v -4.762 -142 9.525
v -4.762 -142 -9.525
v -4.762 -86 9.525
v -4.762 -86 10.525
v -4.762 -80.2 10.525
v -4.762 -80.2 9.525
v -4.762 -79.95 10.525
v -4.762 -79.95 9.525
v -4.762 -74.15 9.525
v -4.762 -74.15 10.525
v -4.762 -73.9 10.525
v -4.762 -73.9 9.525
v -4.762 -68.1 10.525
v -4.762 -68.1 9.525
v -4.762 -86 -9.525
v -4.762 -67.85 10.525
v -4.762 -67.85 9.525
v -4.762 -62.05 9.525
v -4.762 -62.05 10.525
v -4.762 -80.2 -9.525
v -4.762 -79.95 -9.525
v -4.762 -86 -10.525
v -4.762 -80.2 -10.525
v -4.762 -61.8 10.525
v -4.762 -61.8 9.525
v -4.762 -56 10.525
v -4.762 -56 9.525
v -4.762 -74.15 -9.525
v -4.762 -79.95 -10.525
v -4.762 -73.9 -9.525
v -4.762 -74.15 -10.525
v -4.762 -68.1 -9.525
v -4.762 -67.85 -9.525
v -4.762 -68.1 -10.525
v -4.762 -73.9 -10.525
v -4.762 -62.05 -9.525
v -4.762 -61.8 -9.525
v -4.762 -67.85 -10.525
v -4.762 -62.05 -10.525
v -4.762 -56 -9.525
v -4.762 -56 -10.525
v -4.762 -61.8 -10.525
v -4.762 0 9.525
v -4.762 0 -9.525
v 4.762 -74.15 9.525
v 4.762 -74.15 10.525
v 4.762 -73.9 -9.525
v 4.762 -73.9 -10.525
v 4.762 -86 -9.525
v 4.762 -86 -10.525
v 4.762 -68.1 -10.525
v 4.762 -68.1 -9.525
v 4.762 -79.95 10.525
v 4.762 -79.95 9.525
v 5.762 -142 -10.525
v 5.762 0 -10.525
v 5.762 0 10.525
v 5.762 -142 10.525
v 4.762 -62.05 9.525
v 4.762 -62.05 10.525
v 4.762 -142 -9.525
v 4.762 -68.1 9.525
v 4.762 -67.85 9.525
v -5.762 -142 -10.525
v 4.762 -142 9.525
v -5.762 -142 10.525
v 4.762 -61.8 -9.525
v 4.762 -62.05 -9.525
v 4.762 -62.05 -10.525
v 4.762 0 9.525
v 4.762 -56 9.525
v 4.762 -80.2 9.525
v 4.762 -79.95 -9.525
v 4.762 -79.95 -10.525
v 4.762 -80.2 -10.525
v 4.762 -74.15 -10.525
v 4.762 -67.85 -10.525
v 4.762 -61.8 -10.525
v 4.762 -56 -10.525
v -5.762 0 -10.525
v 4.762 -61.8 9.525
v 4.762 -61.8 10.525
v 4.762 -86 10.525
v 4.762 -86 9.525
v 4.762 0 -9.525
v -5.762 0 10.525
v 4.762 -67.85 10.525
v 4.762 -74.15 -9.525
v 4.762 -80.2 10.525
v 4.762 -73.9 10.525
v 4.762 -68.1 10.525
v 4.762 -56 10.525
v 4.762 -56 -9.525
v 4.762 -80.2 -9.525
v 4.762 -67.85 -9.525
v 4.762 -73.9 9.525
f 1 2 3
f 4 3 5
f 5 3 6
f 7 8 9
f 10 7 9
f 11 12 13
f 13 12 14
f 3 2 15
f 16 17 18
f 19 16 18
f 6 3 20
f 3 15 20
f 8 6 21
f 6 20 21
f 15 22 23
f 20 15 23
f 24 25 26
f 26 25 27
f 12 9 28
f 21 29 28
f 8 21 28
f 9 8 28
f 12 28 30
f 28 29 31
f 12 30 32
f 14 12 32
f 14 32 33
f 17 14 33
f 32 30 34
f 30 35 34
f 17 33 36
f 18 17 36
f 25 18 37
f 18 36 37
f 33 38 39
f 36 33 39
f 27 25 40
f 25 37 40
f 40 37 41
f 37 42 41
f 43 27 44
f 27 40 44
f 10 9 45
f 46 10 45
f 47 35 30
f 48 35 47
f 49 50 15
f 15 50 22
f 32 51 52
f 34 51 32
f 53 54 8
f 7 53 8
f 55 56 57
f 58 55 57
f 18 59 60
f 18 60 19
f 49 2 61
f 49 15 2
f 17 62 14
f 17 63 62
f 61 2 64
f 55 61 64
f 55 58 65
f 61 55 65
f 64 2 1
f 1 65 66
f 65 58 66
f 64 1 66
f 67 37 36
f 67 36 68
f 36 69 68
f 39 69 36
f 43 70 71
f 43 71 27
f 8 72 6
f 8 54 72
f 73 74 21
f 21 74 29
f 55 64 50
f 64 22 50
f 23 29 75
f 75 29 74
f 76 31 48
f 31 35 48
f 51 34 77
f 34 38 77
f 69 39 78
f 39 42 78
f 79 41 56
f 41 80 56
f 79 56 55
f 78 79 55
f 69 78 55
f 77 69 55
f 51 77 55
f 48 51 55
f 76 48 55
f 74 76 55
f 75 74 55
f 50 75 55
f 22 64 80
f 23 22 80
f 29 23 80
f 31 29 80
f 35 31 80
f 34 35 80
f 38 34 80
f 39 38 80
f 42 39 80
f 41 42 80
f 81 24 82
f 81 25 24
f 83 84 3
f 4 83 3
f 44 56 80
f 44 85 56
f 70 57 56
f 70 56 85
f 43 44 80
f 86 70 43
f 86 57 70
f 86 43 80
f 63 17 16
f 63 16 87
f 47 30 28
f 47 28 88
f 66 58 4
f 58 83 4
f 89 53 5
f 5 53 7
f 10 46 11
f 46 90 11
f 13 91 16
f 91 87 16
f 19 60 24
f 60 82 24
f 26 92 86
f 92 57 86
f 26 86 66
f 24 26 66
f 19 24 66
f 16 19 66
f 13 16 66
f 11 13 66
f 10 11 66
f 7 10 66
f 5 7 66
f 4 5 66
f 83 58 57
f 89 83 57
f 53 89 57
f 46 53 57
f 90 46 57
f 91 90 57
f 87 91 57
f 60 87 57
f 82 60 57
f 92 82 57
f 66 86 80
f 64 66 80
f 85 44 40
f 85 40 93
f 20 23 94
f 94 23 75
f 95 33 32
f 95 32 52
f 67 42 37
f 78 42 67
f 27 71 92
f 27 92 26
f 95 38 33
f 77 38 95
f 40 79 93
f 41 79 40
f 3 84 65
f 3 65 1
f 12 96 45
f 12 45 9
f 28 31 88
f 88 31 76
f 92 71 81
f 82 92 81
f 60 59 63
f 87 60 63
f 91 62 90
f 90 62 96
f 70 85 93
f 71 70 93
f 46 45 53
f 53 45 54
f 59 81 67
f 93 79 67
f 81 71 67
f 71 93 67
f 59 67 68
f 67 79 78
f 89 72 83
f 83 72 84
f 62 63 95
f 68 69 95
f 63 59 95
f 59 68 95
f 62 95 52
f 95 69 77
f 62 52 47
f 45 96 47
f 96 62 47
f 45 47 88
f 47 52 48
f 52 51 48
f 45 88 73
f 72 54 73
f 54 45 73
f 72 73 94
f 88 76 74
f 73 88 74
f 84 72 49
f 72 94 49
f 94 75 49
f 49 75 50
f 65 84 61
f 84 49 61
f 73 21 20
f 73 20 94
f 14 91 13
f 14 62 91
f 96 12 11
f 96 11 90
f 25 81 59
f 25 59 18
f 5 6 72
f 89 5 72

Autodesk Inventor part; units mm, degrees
ref_plane "YZ Plane" through (0, 0, 0) normal (1, 0, 0) x (0, 1, 0)
ref_plane "XZ Plane" through (0, 0, 0) normal (0, 1, 0) x (-1, 0, 0)
ref_plane "XY Plane" through (0, 0, 0) normal (0, 0, 1) x (1, 0, 0)
sketch "Sketch1" plane through (0, 0, 0) normal (0, 1, 0) x (-1, 0, 0)
  line L0 (4.7625, -9.525) -> (-4.7625, -9.525)
  line L1 (-4.7625, -9.525) -> (-4.7625, 9.525)
  line L2 (-4.7625, 9.525) -> (4.7625, 9.525)
  line L3 (4.7625, 9.525) -> (4.7625, -9.525)
  line L4 (5.7625, -10.525) -> (-5.7625, -10.525)
  line L5 (-5.7625, -10.525) -> (-5.7625, 10.525)
  line L6 (-5.7625, 10.525) -> (5.7625, 10.525)
  line L7 (5.7625, 10.525) -> (5.7625, -10.525)
  point P0 (0, 0)
  dimension "d0" = 19.05
  dimension "d1" = 21.05
  dimension "d2" = 9.525
  dimension "d3" = 10.525
  dimension "d4" = 9.525
  dimension "d5" = 4.7625
  dimension "d6" = 11.525
  dimension "d7" = 5.7625
extrude "Extrusion1" add sketch "Sketch1" against normal blind 142
sketch "Sketch2" plane through (5.7625, 0, -10.525) normal (0, 0, -1) x (-1, 0, 0)
  line L0 (11.525, 0) -> (0, 0) projected
  line L1 (0, 0) -> (0, -142) projected
  line L2 (11.525, 0) -> (11.525, -142) projected
  line L3 (-7.7677, -71) -> (26.0331, -71) construction
  line L4 (10.525, -73.9) -> (1, -73.9)
  line L5 (1, -73.9) -> (1, -68.1)
  line L6 (1, -68.1) -> (10.525, -68.1)
  line L7 (10.525, -68.1) -> (10.525, -73.9)
  line L8 (10.525, -67.85) -> (1, -67.85)
  line L9 (1, -67.85) -> (1, -62.05)
  line L10 (1, -62.05) -> (10.525, -62.05)
  line L11 (10.525, -62.05) -> (10.525, -67.85)
  line L12 (10.525, -61.8) -> (1, -61.8)
  line L13 (1, -61.8) -> (1, -56)
  line L14 (1, -56) -> (10.525, -56)
  line L15 (10.525, -56) -> (10.525, -61.8)
  line L16 (10.525, -74.15) -> (1, -74.15)
  line L17 (1, -74.15) -> (1, -79.95)
  line L18 (1, -79.95) -> (10.525, -79.95)
  line L19 (10.525, -79.95) -> (10.525, -74.15)
  line L20 (10.525, -80.2) -> (1, -80.2)
  line L21 (1, -80.2) -> (1, -86)
  line L22 (1, -86) -> (10.525, -86)
  line L23 (10.525, -86) -> (10.525, -80.2)
  point P0 (5.7625, 0)
  dimension "d12" = 71
  dimension "d13" = 5.8
  dimension "d14" = 2.9
  dimension "d15" = 5.8
  dimension "d16" = 5.8
  dimension "d17" = 0.25
  dimension "d18" = 0.25
  dimension "d19" = 5.8
  dimension "d20" = 5.8
  dimension "d25" = 0.25
  dimension "d26" = 0.25
  dimension "d27" = 1
  dimension "d28" = 1
  dimension "d29" = 1
  dimension "d30" = 1
  dimension "d31" = 1
  dimension "d32" = 1
  dimension "d33" = 1
  dimension "d34" = 1
  dimension "d35" = 1
  dimension "d36" = 1
extrude "Extrusion2" cut sketch "Sketch2" against normal through all
equation "\"d2\" = 0.5 * d0"
equation "\"d3\" = 0.5 * d1"
equation "\"d5\" = 0.5 * d4"
equation "\"d7\" = 0.5 * d6"
equation "\"d14\" = 0.5 * d13"
equation "\"d15\" = d13"
equation "\"d16\" = d13"
equation "\"d19\" = d13"
equation "\"d20\" = d13"
equation "\"d28\" = d27"
equation "\"d29\" = d27"
equation "\"d30\" = d27"
equation "\"d31\" = d27"
equation "\"d32\" = d27"
equation "\"d33\" = d27"
equation "\"d34\" = d27"
equation "\"d35\" = d27"
equation "\"d36\" = d27"
properties part number "Waveguide"
